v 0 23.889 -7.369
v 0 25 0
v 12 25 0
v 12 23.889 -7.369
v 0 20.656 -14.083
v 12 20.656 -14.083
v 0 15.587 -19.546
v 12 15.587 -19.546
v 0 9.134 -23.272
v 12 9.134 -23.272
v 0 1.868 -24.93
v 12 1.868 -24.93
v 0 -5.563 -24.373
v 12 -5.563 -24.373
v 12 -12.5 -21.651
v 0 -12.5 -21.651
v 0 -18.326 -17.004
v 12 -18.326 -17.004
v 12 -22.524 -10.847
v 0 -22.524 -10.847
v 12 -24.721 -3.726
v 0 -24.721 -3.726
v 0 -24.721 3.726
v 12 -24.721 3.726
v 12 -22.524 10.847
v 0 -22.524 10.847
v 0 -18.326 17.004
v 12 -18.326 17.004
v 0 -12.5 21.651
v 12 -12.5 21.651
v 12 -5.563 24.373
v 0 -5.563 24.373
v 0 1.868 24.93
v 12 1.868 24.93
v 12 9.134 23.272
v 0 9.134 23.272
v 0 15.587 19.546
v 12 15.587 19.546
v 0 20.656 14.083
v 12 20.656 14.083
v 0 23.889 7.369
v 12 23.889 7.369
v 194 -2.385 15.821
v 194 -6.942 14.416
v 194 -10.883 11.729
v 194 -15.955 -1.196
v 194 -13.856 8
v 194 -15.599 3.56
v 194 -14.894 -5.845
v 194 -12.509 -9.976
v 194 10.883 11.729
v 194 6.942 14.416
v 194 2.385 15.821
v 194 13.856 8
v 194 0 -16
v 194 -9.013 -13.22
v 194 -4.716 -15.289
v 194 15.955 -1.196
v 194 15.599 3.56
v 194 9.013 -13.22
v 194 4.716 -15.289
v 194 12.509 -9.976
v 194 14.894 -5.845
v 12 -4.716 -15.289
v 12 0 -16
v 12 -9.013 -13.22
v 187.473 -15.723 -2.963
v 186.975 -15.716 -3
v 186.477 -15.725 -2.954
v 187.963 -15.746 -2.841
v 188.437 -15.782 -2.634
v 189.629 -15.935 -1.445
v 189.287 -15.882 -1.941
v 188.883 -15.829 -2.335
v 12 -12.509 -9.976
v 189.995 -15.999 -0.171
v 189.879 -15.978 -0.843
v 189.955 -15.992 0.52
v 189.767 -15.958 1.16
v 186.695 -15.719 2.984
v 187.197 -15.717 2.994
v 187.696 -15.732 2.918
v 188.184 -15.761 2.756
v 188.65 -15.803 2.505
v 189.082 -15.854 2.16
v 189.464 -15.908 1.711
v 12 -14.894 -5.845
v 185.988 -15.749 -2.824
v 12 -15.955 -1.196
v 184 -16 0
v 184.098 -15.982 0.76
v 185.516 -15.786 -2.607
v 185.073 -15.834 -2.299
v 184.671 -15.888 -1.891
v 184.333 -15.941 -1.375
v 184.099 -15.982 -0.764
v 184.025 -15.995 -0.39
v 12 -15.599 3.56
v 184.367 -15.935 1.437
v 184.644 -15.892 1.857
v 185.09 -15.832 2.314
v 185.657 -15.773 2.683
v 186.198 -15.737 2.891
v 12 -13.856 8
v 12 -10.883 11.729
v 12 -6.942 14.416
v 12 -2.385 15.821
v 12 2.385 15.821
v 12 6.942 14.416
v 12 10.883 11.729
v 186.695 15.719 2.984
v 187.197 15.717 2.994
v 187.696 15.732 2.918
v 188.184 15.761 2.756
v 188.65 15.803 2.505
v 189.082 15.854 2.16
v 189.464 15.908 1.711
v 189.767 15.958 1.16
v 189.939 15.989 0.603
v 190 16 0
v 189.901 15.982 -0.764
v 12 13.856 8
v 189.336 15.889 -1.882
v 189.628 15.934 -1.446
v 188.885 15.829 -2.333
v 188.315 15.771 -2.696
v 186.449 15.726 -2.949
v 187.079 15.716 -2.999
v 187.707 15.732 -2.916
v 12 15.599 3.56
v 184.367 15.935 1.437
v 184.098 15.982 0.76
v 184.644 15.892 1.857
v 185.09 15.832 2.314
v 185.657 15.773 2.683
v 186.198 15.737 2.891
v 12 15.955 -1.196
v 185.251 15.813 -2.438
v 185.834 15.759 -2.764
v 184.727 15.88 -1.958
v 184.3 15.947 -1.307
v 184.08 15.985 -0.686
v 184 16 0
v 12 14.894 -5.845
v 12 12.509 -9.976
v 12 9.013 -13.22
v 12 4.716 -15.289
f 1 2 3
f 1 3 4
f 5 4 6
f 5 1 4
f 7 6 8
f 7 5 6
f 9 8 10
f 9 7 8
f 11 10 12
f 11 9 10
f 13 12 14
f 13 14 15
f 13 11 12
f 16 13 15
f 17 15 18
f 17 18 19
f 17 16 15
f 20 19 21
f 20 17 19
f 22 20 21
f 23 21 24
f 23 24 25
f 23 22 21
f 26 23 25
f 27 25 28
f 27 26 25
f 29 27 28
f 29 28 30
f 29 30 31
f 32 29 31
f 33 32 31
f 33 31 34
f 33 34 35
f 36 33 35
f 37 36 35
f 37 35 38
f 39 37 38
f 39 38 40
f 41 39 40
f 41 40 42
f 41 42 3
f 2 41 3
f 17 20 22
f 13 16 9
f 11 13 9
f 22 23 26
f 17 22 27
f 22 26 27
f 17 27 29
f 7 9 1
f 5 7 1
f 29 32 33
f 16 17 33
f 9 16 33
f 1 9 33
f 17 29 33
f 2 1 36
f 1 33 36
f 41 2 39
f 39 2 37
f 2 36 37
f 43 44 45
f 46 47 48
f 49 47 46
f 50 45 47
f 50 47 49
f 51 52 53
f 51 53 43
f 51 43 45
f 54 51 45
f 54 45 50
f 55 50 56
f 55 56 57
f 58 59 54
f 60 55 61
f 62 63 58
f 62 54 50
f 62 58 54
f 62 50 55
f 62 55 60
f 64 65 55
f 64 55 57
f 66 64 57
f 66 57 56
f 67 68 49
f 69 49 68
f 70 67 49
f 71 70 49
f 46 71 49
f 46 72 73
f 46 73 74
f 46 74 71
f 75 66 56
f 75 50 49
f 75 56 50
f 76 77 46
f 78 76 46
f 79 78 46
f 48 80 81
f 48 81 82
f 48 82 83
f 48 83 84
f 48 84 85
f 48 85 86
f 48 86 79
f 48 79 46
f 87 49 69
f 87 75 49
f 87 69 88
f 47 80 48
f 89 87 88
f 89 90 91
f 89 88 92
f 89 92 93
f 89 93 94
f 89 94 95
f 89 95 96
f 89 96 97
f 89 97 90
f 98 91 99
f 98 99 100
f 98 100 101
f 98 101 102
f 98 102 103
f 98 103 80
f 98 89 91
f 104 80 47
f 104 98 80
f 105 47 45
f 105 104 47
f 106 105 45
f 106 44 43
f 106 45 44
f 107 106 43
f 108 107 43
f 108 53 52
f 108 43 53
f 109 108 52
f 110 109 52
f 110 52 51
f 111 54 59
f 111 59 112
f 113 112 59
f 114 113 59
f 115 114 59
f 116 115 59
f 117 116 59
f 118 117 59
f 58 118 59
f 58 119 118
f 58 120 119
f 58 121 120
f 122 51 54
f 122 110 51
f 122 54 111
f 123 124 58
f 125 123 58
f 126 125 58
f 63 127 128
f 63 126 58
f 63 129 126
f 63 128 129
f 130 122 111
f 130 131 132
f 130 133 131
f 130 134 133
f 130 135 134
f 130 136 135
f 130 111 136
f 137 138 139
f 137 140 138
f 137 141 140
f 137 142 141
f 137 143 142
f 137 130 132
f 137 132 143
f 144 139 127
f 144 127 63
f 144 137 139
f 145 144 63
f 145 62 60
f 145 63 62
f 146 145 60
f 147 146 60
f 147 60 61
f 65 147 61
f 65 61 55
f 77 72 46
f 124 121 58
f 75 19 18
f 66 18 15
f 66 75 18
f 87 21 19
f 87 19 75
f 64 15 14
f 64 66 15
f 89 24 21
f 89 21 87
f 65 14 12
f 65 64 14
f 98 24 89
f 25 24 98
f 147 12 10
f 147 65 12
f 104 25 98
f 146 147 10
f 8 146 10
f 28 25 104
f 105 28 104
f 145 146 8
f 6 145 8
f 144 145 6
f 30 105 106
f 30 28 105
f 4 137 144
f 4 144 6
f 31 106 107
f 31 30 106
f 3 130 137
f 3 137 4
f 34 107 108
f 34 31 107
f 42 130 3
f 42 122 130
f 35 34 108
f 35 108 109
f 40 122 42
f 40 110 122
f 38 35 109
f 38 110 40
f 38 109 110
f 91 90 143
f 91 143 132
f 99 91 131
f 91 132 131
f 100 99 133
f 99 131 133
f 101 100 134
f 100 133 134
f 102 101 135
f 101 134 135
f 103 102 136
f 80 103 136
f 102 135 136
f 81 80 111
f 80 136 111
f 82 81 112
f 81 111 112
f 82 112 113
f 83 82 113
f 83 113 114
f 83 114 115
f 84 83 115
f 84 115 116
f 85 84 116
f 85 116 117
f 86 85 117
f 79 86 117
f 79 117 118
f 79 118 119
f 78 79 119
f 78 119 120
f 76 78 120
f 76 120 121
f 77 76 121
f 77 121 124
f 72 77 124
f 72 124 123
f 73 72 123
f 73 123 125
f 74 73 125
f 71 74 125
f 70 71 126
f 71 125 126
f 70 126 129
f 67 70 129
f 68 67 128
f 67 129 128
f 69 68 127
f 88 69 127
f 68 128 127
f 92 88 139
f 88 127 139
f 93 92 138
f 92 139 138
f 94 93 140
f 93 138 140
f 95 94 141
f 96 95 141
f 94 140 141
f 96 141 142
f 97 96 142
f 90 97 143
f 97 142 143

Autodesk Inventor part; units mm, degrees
ref_plane "YZ Plane" through (0, 0, 0) normal (1, 0, 0) x (0, 1, 0)
ref_plane "XY Plane" through (0, 0, 0) normal (0, 0, 1) x (1, 0, 0)
sketch "Sketch1" plane through (0, 0, 0) normal (1, 0, 0) x (0, 1, 0)
  line L0 (0, 35) -> (0, -35) projected
  line L1 (-35, 0) -> (35, 0) projected
  circle A0 centre (0, 0) radius 25
  dimension "d0" = 50
extrude "Extrusion1" add sketch "Sketch1" along normal blind 12
sketch "Sketch2" plane through (12, 0, 0) normal (1, 0, 0) x (0, 0, -1)
  circle A0 centre (0, 0) radius 16
  dimension "d3" = 32
extrude "Extrusion2" add sketch "Sketch2" along normal blind 182
ref_plane "Work Plane1" through (0, 16, 0) normal (0, 1, 0) x (-1, 0, 0)
sketch "Sketch3" plane through (0, 16, 0) normal (0, 1, 0) x (-1, 0, 0)
  circle A0 centre (-187, 0) radius 3
  point P0 (0, 0)
  dimension "d7" = 6
extrude "Extrusion3" cut sketch "Sketch3" against normal through all
properties part number "Pin" material "Stainless Steel"
